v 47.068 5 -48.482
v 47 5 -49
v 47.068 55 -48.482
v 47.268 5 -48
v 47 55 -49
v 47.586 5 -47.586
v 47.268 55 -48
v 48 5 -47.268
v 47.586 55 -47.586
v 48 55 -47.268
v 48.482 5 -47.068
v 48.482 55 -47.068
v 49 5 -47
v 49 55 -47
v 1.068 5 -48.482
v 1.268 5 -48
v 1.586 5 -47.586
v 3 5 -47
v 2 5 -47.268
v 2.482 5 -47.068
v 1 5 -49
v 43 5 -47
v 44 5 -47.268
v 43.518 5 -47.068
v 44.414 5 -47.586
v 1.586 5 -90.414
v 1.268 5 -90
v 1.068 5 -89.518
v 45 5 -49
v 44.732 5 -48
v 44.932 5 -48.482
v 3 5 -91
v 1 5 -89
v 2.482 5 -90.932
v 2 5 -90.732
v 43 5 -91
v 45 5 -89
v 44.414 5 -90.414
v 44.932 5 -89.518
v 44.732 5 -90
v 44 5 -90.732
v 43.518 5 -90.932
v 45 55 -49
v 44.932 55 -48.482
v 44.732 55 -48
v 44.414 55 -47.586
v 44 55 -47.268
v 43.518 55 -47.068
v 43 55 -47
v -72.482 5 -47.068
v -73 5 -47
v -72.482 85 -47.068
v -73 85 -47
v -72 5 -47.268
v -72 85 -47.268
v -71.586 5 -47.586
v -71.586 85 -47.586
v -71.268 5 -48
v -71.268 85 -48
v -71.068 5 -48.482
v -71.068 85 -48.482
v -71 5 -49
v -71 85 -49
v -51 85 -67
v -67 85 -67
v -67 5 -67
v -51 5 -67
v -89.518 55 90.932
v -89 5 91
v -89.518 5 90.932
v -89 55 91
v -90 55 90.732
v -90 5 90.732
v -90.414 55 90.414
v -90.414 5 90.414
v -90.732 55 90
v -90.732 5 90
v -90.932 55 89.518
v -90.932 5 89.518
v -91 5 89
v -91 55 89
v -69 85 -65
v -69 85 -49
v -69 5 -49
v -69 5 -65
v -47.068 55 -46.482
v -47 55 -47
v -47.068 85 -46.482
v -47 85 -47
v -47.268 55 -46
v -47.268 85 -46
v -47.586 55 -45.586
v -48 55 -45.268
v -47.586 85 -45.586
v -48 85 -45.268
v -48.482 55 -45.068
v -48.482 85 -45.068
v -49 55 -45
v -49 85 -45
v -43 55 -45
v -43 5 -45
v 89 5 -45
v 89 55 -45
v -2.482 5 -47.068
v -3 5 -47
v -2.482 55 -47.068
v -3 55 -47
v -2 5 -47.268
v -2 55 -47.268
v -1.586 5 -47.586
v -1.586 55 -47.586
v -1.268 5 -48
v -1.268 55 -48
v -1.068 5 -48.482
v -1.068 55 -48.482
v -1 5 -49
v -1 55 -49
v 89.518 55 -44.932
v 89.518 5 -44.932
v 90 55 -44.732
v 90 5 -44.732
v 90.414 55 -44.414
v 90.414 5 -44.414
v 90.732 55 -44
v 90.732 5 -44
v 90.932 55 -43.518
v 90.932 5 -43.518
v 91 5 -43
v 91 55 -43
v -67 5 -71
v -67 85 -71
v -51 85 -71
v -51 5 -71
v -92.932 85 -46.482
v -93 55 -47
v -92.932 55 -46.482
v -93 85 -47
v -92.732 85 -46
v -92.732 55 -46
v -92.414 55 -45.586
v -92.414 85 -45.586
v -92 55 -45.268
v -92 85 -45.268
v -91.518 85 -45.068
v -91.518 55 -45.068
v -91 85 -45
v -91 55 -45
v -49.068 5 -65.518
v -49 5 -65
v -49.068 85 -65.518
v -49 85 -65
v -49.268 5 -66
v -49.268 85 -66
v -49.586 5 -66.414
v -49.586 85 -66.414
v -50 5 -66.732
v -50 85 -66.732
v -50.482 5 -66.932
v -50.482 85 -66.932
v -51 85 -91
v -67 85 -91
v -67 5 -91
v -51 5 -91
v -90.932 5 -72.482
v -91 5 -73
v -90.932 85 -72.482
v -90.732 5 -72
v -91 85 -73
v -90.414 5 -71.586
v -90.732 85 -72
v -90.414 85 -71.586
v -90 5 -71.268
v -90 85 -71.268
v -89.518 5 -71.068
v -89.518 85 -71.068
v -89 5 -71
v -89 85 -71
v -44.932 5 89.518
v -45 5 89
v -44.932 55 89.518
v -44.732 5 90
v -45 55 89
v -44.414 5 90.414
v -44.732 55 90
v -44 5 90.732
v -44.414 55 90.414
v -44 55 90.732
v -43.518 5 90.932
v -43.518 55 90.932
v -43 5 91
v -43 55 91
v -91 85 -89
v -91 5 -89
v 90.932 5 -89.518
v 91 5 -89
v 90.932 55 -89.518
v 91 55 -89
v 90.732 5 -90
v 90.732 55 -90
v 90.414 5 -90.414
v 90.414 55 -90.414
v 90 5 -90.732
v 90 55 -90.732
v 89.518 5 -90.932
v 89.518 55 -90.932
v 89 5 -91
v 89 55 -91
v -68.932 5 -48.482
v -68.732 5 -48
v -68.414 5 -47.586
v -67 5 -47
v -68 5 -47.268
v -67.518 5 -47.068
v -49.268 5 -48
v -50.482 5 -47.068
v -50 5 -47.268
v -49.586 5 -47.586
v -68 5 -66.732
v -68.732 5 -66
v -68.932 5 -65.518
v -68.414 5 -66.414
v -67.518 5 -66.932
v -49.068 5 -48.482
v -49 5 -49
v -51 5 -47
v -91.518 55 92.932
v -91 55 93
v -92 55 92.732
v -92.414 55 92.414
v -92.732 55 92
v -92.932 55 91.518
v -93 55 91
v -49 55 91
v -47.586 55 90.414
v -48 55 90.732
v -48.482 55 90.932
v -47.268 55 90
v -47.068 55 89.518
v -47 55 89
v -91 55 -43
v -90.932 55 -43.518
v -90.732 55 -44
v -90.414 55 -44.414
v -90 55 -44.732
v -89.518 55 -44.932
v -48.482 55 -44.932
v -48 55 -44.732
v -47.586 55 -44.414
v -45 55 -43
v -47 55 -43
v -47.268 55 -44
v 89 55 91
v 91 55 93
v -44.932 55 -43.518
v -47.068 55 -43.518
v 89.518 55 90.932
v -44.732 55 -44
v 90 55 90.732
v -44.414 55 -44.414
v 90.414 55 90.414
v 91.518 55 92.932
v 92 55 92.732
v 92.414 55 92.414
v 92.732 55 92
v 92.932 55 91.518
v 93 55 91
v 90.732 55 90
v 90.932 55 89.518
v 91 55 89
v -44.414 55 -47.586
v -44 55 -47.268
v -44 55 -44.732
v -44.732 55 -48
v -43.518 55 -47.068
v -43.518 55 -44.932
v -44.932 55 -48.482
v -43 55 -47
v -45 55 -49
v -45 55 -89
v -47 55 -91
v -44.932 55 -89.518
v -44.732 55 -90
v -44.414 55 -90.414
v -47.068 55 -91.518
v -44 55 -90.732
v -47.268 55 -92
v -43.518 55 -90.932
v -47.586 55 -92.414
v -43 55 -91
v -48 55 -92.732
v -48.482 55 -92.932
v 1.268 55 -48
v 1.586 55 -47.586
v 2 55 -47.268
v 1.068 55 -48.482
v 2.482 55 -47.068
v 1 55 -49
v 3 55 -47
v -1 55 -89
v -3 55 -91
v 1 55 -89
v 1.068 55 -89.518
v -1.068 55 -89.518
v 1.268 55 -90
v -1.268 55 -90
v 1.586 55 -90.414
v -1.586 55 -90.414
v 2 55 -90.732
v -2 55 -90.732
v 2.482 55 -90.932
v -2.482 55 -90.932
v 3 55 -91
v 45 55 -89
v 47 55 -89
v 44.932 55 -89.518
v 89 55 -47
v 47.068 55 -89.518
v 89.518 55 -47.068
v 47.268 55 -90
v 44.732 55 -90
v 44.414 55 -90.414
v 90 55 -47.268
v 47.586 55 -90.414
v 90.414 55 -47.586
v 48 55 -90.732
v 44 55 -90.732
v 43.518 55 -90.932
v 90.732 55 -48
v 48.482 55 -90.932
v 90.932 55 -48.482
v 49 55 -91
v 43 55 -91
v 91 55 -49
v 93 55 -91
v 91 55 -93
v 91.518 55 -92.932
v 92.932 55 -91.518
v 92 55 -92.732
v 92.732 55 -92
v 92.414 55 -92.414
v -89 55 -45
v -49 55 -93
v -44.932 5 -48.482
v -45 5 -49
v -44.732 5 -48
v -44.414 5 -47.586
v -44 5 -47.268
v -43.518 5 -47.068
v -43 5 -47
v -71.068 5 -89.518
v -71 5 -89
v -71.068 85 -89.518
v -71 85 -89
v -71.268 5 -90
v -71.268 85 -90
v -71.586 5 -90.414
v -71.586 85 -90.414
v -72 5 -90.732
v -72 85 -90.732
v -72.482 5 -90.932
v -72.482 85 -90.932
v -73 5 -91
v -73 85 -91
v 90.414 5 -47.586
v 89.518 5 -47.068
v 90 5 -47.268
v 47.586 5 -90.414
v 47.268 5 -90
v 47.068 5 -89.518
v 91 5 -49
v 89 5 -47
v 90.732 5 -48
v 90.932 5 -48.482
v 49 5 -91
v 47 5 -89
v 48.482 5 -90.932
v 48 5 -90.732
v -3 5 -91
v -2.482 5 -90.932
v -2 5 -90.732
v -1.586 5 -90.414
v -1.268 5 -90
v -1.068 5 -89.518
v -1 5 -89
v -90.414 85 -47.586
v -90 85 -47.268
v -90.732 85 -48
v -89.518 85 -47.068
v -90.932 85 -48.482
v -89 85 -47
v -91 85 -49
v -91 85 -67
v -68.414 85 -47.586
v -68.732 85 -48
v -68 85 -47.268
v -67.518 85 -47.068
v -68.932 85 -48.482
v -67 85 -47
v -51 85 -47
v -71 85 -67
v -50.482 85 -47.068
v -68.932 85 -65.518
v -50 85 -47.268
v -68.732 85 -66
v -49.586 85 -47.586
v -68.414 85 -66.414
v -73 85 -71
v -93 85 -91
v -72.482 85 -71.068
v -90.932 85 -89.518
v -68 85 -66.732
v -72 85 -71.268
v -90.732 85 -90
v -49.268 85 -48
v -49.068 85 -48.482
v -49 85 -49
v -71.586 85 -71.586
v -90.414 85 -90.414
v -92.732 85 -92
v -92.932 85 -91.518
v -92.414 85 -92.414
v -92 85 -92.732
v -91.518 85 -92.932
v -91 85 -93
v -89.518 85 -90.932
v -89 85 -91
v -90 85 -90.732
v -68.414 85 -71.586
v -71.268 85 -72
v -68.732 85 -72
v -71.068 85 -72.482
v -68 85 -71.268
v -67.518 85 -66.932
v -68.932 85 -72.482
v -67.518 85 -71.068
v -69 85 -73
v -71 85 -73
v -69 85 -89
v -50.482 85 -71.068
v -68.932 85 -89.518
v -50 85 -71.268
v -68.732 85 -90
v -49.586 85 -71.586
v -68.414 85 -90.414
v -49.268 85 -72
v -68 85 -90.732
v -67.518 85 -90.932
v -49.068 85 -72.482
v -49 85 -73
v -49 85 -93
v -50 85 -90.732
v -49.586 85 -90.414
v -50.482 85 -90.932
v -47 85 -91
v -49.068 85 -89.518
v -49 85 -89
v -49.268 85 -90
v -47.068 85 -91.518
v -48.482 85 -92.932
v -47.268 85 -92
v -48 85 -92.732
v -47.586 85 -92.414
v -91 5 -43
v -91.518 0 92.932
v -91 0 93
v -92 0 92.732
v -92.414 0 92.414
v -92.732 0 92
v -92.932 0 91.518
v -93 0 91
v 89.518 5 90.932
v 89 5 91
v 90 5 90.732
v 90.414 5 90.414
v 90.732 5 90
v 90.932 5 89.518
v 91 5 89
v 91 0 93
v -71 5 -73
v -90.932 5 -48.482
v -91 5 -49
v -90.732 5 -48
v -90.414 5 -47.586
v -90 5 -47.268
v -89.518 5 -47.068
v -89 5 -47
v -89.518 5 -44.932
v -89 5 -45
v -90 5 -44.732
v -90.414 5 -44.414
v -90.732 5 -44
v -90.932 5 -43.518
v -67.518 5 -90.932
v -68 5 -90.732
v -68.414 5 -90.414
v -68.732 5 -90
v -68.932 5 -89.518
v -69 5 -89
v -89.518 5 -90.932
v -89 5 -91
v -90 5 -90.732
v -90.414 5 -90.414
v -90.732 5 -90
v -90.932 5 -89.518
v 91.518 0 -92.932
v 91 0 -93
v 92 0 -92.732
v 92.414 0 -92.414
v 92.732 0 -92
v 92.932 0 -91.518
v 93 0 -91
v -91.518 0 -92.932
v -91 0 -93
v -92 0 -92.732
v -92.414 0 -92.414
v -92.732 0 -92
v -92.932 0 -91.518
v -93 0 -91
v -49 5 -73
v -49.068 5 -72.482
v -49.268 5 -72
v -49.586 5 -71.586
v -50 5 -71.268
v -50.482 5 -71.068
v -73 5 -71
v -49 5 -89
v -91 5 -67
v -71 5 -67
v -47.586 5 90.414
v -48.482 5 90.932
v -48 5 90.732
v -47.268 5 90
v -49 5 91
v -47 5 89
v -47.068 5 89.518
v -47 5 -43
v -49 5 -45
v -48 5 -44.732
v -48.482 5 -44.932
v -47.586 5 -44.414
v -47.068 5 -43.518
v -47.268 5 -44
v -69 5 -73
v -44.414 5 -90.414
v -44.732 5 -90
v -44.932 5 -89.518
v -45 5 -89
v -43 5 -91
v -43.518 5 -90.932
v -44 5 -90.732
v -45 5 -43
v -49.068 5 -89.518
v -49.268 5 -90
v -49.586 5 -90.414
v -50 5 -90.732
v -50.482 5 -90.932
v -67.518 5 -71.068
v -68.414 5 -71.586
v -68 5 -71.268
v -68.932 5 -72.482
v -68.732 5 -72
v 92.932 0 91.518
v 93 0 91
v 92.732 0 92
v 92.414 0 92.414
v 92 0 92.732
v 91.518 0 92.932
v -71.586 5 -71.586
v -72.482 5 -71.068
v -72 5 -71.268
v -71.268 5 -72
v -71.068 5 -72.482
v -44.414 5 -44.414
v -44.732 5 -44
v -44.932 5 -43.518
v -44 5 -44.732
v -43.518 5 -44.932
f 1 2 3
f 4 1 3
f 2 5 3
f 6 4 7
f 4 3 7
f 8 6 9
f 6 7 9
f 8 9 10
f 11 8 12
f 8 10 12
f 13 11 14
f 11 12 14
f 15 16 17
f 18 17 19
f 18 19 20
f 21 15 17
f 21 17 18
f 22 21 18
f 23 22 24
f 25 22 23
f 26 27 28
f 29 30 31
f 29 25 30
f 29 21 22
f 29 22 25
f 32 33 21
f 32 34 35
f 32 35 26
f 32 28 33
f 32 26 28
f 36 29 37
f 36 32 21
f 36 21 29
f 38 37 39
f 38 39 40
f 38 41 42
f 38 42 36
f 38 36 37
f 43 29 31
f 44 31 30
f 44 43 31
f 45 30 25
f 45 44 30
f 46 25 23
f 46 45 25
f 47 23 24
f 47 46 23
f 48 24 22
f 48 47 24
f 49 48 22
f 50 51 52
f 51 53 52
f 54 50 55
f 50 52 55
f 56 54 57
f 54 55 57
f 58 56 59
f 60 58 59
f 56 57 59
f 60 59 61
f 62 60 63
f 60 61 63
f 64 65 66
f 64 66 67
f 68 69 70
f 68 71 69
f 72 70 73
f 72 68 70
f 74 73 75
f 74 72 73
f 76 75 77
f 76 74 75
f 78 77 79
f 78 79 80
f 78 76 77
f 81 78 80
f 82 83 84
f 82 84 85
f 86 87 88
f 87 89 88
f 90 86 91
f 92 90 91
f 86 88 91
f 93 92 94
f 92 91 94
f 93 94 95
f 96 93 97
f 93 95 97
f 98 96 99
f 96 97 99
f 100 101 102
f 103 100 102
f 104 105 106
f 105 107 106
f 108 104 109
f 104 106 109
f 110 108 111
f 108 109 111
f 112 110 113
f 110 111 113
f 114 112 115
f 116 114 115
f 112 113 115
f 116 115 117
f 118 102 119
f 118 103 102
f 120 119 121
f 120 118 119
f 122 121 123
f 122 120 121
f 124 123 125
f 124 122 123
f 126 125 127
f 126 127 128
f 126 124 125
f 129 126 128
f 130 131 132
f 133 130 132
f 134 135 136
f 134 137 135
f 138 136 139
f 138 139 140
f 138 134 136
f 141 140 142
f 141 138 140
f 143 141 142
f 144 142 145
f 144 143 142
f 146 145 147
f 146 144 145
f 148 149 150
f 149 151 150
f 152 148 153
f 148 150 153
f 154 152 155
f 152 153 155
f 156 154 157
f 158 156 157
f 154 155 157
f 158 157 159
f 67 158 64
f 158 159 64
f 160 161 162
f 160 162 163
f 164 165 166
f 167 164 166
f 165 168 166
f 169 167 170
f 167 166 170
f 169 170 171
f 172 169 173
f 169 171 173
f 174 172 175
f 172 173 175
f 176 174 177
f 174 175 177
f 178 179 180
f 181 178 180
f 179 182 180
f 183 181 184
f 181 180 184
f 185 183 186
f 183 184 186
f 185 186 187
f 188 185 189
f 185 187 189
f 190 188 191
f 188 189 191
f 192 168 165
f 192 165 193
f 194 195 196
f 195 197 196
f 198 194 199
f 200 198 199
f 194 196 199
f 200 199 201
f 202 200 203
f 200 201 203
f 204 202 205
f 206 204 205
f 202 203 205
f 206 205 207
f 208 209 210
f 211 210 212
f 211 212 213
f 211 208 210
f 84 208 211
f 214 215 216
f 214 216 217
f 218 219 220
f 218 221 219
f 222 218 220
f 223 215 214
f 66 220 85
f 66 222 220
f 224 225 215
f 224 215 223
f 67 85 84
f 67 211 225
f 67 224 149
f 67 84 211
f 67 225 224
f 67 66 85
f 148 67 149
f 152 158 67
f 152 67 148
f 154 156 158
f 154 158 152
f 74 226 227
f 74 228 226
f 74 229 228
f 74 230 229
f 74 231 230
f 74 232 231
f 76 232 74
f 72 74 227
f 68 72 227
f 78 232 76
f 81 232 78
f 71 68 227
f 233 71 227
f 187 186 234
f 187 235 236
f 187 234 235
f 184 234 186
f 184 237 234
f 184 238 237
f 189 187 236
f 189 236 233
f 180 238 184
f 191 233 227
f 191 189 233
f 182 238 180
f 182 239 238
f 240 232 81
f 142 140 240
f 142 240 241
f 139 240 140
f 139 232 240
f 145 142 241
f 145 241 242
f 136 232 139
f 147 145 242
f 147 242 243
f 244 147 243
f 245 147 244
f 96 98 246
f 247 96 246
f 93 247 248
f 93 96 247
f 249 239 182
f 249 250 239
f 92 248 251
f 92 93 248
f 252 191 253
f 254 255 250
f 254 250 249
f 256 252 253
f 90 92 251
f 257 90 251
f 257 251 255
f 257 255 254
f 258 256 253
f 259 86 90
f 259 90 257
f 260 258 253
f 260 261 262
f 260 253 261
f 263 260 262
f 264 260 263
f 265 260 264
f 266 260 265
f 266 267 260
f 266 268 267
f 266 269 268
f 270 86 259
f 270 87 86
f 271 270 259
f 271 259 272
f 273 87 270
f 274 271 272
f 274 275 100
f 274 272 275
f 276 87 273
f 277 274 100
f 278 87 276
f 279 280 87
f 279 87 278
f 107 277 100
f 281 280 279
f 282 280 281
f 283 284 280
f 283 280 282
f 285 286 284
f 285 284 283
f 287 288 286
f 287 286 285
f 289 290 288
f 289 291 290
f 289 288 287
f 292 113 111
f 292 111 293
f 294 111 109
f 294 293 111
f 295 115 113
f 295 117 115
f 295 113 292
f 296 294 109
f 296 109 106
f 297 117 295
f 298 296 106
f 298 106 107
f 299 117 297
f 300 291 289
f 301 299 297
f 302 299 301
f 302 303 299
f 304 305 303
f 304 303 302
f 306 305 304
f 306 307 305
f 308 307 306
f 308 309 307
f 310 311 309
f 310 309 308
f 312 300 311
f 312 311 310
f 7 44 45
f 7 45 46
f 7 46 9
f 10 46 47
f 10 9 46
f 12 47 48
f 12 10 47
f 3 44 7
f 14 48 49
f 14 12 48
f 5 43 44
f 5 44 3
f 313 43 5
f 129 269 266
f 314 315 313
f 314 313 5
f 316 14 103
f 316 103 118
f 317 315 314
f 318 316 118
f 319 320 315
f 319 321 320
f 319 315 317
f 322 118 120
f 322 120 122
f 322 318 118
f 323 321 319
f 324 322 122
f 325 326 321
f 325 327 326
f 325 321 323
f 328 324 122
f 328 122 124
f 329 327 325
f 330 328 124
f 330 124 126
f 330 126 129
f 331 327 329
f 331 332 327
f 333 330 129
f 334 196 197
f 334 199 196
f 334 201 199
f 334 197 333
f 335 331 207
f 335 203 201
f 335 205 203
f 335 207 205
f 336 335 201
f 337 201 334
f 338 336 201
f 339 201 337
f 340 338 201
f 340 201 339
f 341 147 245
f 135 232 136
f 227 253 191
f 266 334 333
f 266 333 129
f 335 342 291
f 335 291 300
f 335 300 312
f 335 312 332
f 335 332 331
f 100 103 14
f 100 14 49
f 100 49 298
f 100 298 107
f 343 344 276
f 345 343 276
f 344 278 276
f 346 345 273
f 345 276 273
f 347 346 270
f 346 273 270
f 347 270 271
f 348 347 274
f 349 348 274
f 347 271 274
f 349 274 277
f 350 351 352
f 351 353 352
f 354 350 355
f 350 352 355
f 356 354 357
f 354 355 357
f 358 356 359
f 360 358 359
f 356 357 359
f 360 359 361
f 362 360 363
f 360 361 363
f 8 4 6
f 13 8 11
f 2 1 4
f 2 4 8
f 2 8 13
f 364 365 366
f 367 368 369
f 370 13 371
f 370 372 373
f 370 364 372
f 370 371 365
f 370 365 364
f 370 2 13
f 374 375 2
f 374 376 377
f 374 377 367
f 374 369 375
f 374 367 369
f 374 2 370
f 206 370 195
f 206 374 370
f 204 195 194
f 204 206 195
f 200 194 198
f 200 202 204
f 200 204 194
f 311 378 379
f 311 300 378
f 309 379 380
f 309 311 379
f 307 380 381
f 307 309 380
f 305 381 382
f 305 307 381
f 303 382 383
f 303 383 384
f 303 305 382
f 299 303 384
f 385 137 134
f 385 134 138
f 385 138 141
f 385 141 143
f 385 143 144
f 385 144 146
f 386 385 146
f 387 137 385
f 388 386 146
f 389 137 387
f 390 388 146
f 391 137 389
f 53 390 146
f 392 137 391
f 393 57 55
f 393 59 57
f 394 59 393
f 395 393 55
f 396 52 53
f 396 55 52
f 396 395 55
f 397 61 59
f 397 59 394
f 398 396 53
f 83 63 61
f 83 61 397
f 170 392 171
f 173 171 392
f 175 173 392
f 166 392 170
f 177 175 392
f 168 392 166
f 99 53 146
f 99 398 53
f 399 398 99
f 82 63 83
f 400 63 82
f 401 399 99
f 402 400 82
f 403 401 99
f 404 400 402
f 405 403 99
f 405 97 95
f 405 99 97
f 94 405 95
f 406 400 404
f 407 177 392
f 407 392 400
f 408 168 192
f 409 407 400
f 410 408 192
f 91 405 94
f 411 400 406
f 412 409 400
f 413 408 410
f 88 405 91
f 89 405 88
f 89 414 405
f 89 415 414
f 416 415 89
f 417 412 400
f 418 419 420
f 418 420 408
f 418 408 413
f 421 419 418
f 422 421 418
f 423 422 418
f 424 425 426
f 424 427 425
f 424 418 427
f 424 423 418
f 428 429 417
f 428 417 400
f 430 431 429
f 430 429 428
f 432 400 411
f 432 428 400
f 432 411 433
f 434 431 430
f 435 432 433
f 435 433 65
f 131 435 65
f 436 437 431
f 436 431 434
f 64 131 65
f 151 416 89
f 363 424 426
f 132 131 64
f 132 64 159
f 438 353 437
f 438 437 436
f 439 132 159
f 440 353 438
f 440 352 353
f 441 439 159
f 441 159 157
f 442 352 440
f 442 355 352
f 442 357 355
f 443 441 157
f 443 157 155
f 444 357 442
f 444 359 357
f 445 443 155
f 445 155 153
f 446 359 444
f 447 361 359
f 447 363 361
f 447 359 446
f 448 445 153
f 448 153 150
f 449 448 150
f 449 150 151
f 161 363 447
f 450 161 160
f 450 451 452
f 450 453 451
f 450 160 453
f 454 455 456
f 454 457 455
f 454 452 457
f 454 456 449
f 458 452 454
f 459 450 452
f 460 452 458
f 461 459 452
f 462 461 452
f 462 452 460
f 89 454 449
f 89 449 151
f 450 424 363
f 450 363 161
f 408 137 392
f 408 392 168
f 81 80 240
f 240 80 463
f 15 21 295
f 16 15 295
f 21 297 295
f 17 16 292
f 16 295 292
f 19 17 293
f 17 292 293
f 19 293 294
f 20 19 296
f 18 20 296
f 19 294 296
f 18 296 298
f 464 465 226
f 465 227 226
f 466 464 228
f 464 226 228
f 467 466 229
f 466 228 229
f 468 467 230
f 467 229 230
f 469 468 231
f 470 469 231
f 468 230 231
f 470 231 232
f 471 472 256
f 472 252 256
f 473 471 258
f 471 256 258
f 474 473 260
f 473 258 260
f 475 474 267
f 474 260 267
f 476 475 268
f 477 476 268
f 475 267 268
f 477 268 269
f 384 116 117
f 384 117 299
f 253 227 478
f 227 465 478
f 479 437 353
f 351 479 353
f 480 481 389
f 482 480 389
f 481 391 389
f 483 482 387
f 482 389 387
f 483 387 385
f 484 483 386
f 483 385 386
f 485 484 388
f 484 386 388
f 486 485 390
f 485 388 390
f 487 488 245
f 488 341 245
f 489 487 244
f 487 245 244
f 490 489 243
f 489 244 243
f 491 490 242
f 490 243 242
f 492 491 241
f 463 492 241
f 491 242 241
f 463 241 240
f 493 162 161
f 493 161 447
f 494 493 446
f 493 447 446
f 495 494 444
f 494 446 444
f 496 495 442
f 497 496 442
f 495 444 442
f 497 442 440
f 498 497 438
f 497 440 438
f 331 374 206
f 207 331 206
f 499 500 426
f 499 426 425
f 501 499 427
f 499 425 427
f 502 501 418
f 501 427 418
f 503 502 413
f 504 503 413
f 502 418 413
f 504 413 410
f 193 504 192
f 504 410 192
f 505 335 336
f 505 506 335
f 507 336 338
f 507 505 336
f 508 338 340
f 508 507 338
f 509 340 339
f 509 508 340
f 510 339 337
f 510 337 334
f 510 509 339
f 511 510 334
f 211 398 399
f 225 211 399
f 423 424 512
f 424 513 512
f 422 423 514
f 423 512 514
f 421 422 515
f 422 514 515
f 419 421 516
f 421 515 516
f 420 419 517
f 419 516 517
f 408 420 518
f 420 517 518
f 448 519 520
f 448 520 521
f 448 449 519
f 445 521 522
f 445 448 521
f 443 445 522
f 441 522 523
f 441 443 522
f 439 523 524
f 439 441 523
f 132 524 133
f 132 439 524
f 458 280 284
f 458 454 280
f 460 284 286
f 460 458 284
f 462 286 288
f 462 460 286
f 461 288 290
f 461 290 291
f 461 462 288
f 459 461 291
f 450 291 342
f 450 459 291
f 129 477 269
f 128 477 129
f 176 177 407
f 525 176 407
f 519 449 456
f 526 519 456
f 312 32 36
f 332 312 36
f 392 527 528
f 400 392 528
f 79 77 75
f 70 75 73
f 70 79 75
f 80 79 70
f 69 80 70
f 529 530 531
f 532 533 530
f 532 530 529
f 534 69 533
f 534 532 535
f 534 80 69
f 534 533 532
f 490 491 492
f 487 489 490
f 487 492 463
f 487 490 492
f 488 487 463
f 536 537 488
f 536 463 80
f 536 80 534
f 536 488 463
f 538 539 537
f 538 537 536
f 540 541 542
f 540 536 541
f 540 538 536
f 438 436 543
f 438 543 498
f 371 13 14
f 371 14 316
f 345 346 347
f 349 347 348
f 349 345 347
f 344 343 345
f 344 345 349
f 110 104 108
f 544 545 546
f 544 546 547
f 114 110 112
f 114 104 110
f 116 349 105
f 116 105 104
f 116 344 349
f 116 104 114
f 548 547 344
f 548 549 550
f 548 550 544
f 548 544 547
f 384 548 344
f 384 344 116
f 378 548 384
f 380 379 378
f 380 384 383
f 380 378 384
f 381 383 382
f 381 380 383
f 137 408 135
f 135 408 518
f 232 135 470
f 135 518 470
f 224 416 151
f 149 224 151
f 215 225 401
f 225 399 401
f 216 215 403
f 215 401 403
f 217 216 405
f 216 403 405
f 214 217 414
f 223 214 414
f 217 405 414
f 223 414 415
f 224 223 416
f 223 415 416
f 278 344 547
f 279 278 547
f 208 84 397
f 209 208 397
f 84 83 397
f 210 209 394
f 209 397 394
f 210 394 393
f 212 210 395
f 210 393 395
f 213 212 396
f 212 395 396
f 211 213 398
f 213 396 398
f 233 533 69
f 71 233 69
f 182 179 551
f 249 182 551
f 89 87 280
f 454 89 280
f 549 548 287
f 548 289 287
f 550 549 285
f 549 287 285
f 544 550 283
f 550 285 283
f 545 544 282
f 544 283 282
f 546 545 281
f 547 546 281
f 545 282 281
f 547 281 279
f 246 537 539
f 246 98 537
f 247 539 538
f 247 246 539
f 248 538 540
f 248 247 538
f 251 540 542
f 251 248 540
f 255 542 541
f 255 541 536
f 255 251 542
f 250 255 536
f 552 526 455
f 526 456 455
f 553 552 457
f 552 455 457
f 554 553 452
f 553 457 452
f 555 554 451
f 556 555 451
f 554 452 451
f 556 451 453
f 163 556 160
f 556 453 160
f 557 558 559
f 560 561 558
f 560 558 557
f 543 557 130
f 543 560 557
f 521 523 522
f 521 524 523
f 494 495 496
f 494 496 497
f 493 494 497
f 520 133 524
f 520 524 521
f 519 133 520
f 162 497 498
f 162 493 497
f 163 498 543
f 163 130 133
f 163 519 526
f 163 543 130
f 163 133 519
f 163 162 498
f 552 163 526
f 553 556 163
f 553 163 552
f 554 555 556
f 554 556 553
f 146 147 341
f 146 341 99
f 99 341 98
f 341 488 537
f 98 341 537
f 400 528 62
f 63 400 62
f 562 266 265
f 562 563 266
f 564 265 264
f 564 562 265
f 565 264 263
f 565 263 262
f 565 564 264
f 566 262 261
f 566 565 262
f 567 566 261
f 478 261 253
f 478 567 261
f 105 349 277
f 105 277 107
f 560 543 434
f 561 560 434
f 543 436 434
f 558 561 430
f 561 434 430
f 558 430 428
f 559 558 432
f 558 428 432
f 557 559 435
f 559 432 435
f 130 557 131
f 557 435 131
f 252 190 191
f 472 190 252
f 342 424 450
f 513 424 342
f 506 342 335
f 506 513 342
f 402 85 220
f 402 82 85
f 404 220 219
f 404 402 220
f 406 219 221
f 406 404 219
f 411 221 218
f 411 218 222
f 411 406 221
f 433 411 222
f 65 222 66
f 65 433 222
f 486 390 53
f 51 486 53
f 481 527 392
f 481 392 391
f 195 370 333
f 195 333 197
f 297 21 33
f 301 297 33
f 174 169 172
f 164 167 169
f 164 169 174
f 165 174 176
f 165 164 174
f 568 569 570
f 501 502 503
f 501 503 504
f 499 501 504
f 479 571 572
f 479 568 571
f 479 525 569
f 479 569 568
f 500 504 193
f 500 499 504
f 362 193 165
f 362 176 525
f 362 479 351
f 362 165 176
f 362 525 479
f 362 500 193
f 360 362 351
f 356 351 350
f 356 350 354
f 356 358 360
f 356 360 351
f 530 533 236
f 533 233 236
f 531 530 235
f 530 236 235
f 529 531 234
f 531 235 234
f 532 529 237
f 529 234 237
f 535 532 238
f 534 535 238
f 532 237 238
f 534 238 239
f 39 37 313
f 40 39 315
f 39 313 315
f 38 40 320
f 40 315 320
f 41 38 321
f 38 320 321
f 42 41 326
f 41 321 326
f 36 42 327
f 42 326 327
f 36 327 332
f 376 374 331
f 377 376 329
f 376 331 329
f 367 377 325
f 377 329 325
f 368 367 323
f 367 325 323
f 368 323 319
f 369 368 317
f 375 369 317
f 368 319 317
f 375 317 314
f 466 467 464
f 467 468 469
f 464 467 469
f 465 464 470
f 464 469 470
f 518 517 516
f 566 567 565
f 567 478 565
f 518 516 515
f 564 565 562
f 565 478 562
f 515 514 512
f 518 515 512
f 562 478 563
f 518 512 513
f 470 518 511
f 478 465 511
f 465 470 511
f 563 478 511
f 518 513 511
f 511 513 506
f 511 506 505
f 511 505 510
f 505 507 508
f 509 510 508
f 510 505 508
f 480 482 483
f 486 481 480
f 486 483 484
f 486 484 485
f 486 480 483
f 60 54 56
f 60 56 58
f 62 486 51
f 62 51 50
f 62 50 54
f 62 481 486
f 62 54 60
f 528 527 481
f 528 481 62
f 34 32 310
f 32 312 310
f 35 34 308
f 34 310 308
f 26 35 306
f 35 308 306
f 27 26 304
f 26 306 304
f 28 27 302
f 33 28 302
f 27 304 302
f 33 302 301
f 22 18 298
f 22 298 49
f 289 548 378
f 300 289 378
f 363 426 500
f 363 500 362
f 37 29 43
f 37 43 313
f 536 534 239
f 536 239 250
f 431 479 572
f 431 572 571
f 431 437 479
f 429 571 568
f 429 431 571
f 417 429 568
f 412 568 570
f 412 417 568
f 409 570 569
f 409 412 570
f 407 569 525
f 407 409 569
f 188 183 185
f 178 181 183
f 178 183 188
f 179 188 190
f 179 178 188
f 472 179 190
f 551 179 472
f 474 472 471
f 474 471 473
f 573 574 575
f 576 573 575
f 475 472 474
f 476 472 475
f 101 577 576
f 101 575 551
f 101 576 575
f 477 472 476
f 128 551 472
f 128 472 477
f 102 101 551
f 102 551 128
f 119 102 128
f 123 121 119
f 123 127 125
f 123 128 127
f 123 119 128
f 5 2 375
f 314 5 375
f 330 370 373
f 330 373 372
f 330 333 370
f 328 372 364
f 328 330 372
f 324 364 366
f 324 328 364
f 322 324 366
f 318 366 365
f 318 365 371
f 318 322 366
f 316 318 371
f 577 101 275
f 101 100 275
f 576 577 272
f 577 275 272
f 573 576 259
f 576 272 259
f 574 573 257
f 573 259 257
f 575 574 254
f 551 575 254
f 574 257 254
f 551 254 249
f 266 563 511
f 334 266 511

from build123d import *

# Parameters (mm, degrees)
SKETCH1_W                   = 186
SKETCH1_H                   = 186
BOSS_EXTRUDE1_DEPTH         = 5
SKETCH2_W                   = 23
SKETCH2_H                   = 24
SKETCH2_W_2                 = 20
SKETCH2_H_2                 = 20
BOSS_EXTRUDE2_DEPTH         = 80
LPATTERN1_COUNT             = 2
LPATTERN1_PITCH             = 22
MIRROR1_COPY_1_SKETCH_W     = 23
MIRROR1_COPY_1_SKETCH_H     = 24
MIRROR1_COPY_1_SKETCH_W_2   = 20
MIRROR1_COPY_1_SKETCH_H_2   = 20
MIRROR1_COPY_1_DEPTH        = 80
SKETCH3_W                   = 1
SKETCH3_H                   = 48
BOSS_EXTRUDE3_DEPTH         = 80
SKETCH4_W                   = 48
SKETCH4_H                   = 48
SKETCH4_W_2                 = 44
SKETCH4_H_2                 = 44
BOSS_EXTRUDE4_DEPTH         = 50
LPATTERN2_COUNT             = 3
LPATTERN2_PITCH             = 46
LPATTERN3_COUNT             = 4
LPATTERN3_PITCH             = 46
LPATTERN3_COPY_1_SKETCH_W   = 48
LPATTERN3_COPY_1_SKETCH_H   = 48
LPATTERN3_COPY_1_SKETCH_W_2 = 44
LPATTERN3_COPY_1_SKETCH_H_2 = 44
LPATTERN3_COPY_1_DEPTH      = 50
LPATTERN3_COPY_2_SKETCH_W   = 48
LPATTERN3_COPY_2_SKETCH_H   = 48
LPATTERN3_COPY_2_SKETCH_W_2 = 44
LPATTERN3_COPY_2_SKETCH_H_2 = 44
LPATTERN3_COPY_2_DEPTH      = 50
LPATTERN3_COPY_3_SKETCH_W   = 48
LPATTERN3_COPY_3_SKETCH_H   = 48
LPATTERN3_COPY_3_SKETCH_W_2 = 44
LPATTERN3_COPY_3_SKETCH_H_2 = 44
LPATTERN3_COPY_3_DEPTH      = 50
LPATTERN3_COPY_4_SKETCH_W   = 48
LPATTERN3_COPY_4_SKETCH_H   = 48
LPATTERN3_COPY_4_SKETCH_W_2 = 44
LPATTERN3_COPY_4_SKETCH_H_2 = 44
LPATTERN3_COPY_4_DEPTH      = 50
LPATTERN3_COPY_5_SKETCH_W   = 48
LPATTERN3_COPY_5_SKETCH_H   = 48
LPATTERN3_COPY_5_SKETCH_W_2 = 44
LPATTERN3_COPY_5_SKETCH_H_2 = 44
LPATTERN3_COPY_5_DEPTH      = 50
LPATTERN3_COPY_6_SKETCH_W   = 48
LPATTERN3_COPY_6_SKETCH_H   = 48
LPATTERN3_COPY_6_SKETCH_W_2 = 44
LPATTERN3_COPY_6_SKETCH_H_2 = 44
LPATTERN3_COPY_6_DEPTH      = 50
BOSS_EXTRUDE6_DEPTH         = 50
SKETCH9_W                   = 136
SKETCH9_H                   = 136
CUT_EXTRUDE2_DEPTH          = 50
FILLET1_R                   = 2
FILLET2_R                   = 2


with BuildPart() as part:
    # Sketch1 → Boss-Extrude1 (new body)
    with BuildSketch(Plane(origin=(0, 0, 0), x_dir=(1, 0, 0), z_dir=(0, 1, 0))):
        Rectangle(SKETCH1_W, SKETCH1_H)
    extrude(amount=BOSS_EXTRUDE1_DEPTH)

    # Sketch2 → Boss-Extrude2 (add)
    with BuildSketch(Plane(origin=(0, 5, 0), x_dir=(1, 0, 0), z_dir=(0, 1, 0))):
        with Locations((-81.5, 81)):
            Rectangle(SKETCH2_W, SKETCH2_H)
        with Locations((-81, 81)):
            Rectangle(SKETCH2_W_2, SKETCH2_H_2, mode=Mode.SUBTRACT)
    boss_extrude2 = extrude(amount=BOSS_EXTRUDE2_DEPTH)

    # LPattern1: Boss-Extrude2 ×2
    with Locations(*[(i * LPATTERN1_PITCH, 0, 0) for i in range(1, LPATTERN1_COUNT)]):
        add(boss_extrude2)

    # Mirror1: Boss-Extrude2 across plane
    add(boss_extrude2.mirror(Plane(origin=(-93, 85, -69), x_dir=(1, 0, 0), z_dir=(0, 0, -1))))

    # Mirror1 copy 1 sketch → Mirror1 copy 1 (add)
    with BuildSketch(Plane(origin=(22, 5, -138), x_dir=(1, 0, 0), z_dir=(0, 1, 0))):
        with Locations((-81.5, -81)):
            Rectangle(MIRROR1_COPY_1_SKETCH_W, MIRROR1_COPY_1_SKETCH_H)
        with Locations((-81, -81)):
            Rectangle(MIRROR1_COPY_1_SKETCH_W_2, MIRROR1_COPY_1_SKETCH_H_2, mode=Mode.SUBTRACT)
    extrude(amount=MIRROR1_COPY_1_DEPTH)

    # Sketch3 → Boss-Extrude3 (add)
    with BuildSketch(Plane(origin=(0, 5, 0), x_dir=(1, 0, 0), z_dir=(0, 1, 0))):
        with Locations((-47.5, 69)):
            Rectangle(SKETCH3_W, SKETCH3_H)
    extrude(amount=BOSS_EXTRUDE3_DEPTH)

    # Sketch4 → Boss-Extrude4 (add)
    with BuildSketch(Plane(origin=(0, 5, 0), x_dir=(1, 0, 0), z_dir=(0, 1, 0))):
        with Locations((-23, 69)):
            Rectangle(SKETCH4_W, SKETCH4_H)
        with Locations((-23, 69)):
            Rectangle(SKETCH4_W_2, SKETCH4_H_2, mode=Mode.SUBTRACT)
    boss_extrude4 = extrude(amount=BOSS_EXTRUDE4_DEPTH)

    # LPattern2: Boss-Extrude4 ×3
    with Locations(*[(i * LPATTERN2_PITCH, 0, 0) for i in range(1, LPATTERN2_COUNT)]):
        add(boss_extrude4)

    # LPattern3: Boss-Extrude4 ×4
    with Locations(*[(0, 0, i * LPATTERN3_PITCH) for i in range(1, LPATTERN3_COUNT)]):
        add(boss_extrude4)

    # LPattern3 copy 1 sketch → LPattern3 copy 1 (add)
    with BuildSketch(Plane(origin=(46, 5, 46), x_dir=(1, 0, 0), z_dir=(0, 1, 0))):
        with Locations((-23, 69)):
            Rectangle(LPATTERN3_COPY_1_SKETCH_W, LPATTERN3_COPY_1_SKETCH_H)
        with Locations((-23, 69)):
            Rectangle(LPATTERN3_COPY_1_SKETCH_W_2, LPATTERN3_COPY_1_SKETCH_H_2, mode=Mode.SUBTRACT)
    extrude(amount=LPATTERN3_COPY_1_DEPTH)

    # LPattern3 copy 2 sketch → LPattern3 copy 2 (add)
    with BuildSketch(Plane(origin=(46, 5, 92), x_dir=(1, 0, 0), z_dir=(0, 1, 0))):
        with Locations((-23, 69)):
            Rectangle(LPATTERN3_COPY_2_SKETCH_W, LPATTERN3_COPY_2_SKETCH_H)
        with Locations((-23, 69)):
            Rectangle(LPATTERN3_COPY_2_SKETCH_W_2, LPATTERN3_COPY_2_SKETCH_H_2, mode=Mode.SUBTRACT)
    extrude(amount=LPATTERN3_COPY_2_DEPTH)

    # LPattern3 copy 3 sketch → LPattern3 copy 3 (add)
    with BuildSketch(Plane(origin=(46, 5, 138), x_dir=(1, 0, 0), z_dir=(0, 1, 0))):
        with Locations((-23, 69)):
            Rectangle(LPATTERN3_COPY_3_SKETCH_W, LPATTERN3_COPY_3_SKETCH_H)
        with Locations((-23, 69)):
            Rectangle(LPATTERN3_COPY_3_SKETCH_W_2, LPATTERN3_COPY_3_SKETCH_H_2, mode=Mode.SUBTRACT)
    extrude(amount=LPATTERN3_COPY_3_DEPTH)

    # LPattern3 copy 4 sketch → LPattern3 copy 4 (add)
    with BuildSketch(Plane(origin=(92, 5, 46), x_dir=(1, 0, 0), z_dir=(0, 1, 0))):
        with Locations((-23, 69)):
            Rectangle(LPATTERN3_COPY_4_SKETCH_W, LPATTERN3_COPY_4_SKETCH_H)
        with Locations((-23, 69)):
            Rectangle(LPATTERN3_COPY_4_SKETCH_W_2, LPATTERN3_COPY_4_SKETCH_H_2, mode=Mode.SUBTRACT)
    extrude(amount=LPATTERN3_COPY_4_DEPTH)

    # LPattern3 copy 5 sketch → LPattern3 copy 5 (add)
    with BuildSketch(Plane(origin=(92, 5, 92), x_dir=(1, 0, 0), z_dir=(0, 1, 0))):
        with Locations((-23, 69)):
            Rectangle(LPATTERN3_COPY_5_SKETCH_W, LPATTERN3_COPY_5_SKETCH_H)
        with Locations((-23, 69)):
            Rectangle(LPATTERN3_COPY_5_SKETCH_W_2, LPATTERN3_COPY_5_SKETCH_H_2, mode=Mode.SUBTRACT)
    extrude(amount=LPATTERN3_COPY_5_DEPTH)

    # LPattern3 copy 6 sketch → LPattern3 copy 6 (add)
    with BuildSketch(Plane(origin=(92, 5, 138), x_dir=(1, 0, 0), z_dir=(0, 1, 0))):
        with Locations((-23, 69)):
            Rectangle(LPATTERN3_COPY_6_SKETCH_W, LPATTERN3_COPY_6_SKETCH_H)
        with Locations((-23, 69)):
            Rectangle(LPATTERN3_COPY_6_SKETCH_W_2, LPATTERN3_COPY_6_SKETCH_H_2, mode=Mode.SUBTRACT)
    extrude(amount=LPATTERN3_COPY_6_DEPTH)

    # Sketch6 → Boss-Extrude6 (add)
    with BuildSketch(Plane(origin=(0, 5, 0), x_dir=(1, 0, 0), z_dir=(0, 1, 0))):
        Polygon((-47, -93), (-47, -91), (-91, -91), (-91, 45), (-93, 45), (-93, -93), align=None)
    extrude(amount=BOSS_EXTRUDE6_DEPTH)

    # Sketch9 → Cut-Extrude2 (cut)
    with BuildSketch(Plane(origin=(0, 5, 0), x_dir=(1, 0, 0), z_dir=(0, 1, 0))):
        with Locations((23, -23)):
            Rectangle(SKETCH9_W, SKETCH9_H)
    extrude(amount=CUT_EXTRUDE2_DEPTH, mode=Mode.SUBTRACT)

    # Fillet1
    fillet1_edges = [part.edges().sort_by_distance(p)[0] for p in [
        (-69, 45, -47),
        (-49, 45, -47),
        (-49, 45, -67),
        (-69, 45, -67),
        (-47, 70, -93),
        (-45, 30, -91),
        (-45, 30, -47),
        (-1, 30, -47),
        (-1, 30, -91),
        (47, 30, -47),
        (1, 30, -91),
        (1, 30, -47),
        (45, 30, -47),
        (45, 30, -91),
        (47, 30, -91),
        (91, 30, -47),
        (91, 30, -91),
        (-91, 45, -71),
        (-71, 45, -71),
        (-71, 45, -91),
        (-91, 45, -91),
        (-47, 30, -45),
        (-45, 30, -45),
        (-45, 30, 91),
        (91, 30, -45),
        (91, 30, 91),
        (-47, 30, 91),
        (-91, 30, 91),
        (-91, 30, -45),
        (-69, 45, -71),
        (-49, 45, -71),
        (-49, 45, -91),
        (-69, 45, -91),
        (-93, 42.5, -93),
        (93, 27.5, -93),
        (93, 27.5, 93),
        (-93, 27.5, 93),
        (-91, 45, -47),
        (-71, 45, -47),
    ]]
    fillet(fillet1_edges, radius=FILLET1_R)

    # Fillet2
    fillet2_edges = [part.edges().sort_by_distance(p)[0] for p in [
        (-47, 70, -45),
        (-93, 70, -45),
    ]]
    fillet(fillet2_edges, radius=FILLET2_R)


solid = part.part
